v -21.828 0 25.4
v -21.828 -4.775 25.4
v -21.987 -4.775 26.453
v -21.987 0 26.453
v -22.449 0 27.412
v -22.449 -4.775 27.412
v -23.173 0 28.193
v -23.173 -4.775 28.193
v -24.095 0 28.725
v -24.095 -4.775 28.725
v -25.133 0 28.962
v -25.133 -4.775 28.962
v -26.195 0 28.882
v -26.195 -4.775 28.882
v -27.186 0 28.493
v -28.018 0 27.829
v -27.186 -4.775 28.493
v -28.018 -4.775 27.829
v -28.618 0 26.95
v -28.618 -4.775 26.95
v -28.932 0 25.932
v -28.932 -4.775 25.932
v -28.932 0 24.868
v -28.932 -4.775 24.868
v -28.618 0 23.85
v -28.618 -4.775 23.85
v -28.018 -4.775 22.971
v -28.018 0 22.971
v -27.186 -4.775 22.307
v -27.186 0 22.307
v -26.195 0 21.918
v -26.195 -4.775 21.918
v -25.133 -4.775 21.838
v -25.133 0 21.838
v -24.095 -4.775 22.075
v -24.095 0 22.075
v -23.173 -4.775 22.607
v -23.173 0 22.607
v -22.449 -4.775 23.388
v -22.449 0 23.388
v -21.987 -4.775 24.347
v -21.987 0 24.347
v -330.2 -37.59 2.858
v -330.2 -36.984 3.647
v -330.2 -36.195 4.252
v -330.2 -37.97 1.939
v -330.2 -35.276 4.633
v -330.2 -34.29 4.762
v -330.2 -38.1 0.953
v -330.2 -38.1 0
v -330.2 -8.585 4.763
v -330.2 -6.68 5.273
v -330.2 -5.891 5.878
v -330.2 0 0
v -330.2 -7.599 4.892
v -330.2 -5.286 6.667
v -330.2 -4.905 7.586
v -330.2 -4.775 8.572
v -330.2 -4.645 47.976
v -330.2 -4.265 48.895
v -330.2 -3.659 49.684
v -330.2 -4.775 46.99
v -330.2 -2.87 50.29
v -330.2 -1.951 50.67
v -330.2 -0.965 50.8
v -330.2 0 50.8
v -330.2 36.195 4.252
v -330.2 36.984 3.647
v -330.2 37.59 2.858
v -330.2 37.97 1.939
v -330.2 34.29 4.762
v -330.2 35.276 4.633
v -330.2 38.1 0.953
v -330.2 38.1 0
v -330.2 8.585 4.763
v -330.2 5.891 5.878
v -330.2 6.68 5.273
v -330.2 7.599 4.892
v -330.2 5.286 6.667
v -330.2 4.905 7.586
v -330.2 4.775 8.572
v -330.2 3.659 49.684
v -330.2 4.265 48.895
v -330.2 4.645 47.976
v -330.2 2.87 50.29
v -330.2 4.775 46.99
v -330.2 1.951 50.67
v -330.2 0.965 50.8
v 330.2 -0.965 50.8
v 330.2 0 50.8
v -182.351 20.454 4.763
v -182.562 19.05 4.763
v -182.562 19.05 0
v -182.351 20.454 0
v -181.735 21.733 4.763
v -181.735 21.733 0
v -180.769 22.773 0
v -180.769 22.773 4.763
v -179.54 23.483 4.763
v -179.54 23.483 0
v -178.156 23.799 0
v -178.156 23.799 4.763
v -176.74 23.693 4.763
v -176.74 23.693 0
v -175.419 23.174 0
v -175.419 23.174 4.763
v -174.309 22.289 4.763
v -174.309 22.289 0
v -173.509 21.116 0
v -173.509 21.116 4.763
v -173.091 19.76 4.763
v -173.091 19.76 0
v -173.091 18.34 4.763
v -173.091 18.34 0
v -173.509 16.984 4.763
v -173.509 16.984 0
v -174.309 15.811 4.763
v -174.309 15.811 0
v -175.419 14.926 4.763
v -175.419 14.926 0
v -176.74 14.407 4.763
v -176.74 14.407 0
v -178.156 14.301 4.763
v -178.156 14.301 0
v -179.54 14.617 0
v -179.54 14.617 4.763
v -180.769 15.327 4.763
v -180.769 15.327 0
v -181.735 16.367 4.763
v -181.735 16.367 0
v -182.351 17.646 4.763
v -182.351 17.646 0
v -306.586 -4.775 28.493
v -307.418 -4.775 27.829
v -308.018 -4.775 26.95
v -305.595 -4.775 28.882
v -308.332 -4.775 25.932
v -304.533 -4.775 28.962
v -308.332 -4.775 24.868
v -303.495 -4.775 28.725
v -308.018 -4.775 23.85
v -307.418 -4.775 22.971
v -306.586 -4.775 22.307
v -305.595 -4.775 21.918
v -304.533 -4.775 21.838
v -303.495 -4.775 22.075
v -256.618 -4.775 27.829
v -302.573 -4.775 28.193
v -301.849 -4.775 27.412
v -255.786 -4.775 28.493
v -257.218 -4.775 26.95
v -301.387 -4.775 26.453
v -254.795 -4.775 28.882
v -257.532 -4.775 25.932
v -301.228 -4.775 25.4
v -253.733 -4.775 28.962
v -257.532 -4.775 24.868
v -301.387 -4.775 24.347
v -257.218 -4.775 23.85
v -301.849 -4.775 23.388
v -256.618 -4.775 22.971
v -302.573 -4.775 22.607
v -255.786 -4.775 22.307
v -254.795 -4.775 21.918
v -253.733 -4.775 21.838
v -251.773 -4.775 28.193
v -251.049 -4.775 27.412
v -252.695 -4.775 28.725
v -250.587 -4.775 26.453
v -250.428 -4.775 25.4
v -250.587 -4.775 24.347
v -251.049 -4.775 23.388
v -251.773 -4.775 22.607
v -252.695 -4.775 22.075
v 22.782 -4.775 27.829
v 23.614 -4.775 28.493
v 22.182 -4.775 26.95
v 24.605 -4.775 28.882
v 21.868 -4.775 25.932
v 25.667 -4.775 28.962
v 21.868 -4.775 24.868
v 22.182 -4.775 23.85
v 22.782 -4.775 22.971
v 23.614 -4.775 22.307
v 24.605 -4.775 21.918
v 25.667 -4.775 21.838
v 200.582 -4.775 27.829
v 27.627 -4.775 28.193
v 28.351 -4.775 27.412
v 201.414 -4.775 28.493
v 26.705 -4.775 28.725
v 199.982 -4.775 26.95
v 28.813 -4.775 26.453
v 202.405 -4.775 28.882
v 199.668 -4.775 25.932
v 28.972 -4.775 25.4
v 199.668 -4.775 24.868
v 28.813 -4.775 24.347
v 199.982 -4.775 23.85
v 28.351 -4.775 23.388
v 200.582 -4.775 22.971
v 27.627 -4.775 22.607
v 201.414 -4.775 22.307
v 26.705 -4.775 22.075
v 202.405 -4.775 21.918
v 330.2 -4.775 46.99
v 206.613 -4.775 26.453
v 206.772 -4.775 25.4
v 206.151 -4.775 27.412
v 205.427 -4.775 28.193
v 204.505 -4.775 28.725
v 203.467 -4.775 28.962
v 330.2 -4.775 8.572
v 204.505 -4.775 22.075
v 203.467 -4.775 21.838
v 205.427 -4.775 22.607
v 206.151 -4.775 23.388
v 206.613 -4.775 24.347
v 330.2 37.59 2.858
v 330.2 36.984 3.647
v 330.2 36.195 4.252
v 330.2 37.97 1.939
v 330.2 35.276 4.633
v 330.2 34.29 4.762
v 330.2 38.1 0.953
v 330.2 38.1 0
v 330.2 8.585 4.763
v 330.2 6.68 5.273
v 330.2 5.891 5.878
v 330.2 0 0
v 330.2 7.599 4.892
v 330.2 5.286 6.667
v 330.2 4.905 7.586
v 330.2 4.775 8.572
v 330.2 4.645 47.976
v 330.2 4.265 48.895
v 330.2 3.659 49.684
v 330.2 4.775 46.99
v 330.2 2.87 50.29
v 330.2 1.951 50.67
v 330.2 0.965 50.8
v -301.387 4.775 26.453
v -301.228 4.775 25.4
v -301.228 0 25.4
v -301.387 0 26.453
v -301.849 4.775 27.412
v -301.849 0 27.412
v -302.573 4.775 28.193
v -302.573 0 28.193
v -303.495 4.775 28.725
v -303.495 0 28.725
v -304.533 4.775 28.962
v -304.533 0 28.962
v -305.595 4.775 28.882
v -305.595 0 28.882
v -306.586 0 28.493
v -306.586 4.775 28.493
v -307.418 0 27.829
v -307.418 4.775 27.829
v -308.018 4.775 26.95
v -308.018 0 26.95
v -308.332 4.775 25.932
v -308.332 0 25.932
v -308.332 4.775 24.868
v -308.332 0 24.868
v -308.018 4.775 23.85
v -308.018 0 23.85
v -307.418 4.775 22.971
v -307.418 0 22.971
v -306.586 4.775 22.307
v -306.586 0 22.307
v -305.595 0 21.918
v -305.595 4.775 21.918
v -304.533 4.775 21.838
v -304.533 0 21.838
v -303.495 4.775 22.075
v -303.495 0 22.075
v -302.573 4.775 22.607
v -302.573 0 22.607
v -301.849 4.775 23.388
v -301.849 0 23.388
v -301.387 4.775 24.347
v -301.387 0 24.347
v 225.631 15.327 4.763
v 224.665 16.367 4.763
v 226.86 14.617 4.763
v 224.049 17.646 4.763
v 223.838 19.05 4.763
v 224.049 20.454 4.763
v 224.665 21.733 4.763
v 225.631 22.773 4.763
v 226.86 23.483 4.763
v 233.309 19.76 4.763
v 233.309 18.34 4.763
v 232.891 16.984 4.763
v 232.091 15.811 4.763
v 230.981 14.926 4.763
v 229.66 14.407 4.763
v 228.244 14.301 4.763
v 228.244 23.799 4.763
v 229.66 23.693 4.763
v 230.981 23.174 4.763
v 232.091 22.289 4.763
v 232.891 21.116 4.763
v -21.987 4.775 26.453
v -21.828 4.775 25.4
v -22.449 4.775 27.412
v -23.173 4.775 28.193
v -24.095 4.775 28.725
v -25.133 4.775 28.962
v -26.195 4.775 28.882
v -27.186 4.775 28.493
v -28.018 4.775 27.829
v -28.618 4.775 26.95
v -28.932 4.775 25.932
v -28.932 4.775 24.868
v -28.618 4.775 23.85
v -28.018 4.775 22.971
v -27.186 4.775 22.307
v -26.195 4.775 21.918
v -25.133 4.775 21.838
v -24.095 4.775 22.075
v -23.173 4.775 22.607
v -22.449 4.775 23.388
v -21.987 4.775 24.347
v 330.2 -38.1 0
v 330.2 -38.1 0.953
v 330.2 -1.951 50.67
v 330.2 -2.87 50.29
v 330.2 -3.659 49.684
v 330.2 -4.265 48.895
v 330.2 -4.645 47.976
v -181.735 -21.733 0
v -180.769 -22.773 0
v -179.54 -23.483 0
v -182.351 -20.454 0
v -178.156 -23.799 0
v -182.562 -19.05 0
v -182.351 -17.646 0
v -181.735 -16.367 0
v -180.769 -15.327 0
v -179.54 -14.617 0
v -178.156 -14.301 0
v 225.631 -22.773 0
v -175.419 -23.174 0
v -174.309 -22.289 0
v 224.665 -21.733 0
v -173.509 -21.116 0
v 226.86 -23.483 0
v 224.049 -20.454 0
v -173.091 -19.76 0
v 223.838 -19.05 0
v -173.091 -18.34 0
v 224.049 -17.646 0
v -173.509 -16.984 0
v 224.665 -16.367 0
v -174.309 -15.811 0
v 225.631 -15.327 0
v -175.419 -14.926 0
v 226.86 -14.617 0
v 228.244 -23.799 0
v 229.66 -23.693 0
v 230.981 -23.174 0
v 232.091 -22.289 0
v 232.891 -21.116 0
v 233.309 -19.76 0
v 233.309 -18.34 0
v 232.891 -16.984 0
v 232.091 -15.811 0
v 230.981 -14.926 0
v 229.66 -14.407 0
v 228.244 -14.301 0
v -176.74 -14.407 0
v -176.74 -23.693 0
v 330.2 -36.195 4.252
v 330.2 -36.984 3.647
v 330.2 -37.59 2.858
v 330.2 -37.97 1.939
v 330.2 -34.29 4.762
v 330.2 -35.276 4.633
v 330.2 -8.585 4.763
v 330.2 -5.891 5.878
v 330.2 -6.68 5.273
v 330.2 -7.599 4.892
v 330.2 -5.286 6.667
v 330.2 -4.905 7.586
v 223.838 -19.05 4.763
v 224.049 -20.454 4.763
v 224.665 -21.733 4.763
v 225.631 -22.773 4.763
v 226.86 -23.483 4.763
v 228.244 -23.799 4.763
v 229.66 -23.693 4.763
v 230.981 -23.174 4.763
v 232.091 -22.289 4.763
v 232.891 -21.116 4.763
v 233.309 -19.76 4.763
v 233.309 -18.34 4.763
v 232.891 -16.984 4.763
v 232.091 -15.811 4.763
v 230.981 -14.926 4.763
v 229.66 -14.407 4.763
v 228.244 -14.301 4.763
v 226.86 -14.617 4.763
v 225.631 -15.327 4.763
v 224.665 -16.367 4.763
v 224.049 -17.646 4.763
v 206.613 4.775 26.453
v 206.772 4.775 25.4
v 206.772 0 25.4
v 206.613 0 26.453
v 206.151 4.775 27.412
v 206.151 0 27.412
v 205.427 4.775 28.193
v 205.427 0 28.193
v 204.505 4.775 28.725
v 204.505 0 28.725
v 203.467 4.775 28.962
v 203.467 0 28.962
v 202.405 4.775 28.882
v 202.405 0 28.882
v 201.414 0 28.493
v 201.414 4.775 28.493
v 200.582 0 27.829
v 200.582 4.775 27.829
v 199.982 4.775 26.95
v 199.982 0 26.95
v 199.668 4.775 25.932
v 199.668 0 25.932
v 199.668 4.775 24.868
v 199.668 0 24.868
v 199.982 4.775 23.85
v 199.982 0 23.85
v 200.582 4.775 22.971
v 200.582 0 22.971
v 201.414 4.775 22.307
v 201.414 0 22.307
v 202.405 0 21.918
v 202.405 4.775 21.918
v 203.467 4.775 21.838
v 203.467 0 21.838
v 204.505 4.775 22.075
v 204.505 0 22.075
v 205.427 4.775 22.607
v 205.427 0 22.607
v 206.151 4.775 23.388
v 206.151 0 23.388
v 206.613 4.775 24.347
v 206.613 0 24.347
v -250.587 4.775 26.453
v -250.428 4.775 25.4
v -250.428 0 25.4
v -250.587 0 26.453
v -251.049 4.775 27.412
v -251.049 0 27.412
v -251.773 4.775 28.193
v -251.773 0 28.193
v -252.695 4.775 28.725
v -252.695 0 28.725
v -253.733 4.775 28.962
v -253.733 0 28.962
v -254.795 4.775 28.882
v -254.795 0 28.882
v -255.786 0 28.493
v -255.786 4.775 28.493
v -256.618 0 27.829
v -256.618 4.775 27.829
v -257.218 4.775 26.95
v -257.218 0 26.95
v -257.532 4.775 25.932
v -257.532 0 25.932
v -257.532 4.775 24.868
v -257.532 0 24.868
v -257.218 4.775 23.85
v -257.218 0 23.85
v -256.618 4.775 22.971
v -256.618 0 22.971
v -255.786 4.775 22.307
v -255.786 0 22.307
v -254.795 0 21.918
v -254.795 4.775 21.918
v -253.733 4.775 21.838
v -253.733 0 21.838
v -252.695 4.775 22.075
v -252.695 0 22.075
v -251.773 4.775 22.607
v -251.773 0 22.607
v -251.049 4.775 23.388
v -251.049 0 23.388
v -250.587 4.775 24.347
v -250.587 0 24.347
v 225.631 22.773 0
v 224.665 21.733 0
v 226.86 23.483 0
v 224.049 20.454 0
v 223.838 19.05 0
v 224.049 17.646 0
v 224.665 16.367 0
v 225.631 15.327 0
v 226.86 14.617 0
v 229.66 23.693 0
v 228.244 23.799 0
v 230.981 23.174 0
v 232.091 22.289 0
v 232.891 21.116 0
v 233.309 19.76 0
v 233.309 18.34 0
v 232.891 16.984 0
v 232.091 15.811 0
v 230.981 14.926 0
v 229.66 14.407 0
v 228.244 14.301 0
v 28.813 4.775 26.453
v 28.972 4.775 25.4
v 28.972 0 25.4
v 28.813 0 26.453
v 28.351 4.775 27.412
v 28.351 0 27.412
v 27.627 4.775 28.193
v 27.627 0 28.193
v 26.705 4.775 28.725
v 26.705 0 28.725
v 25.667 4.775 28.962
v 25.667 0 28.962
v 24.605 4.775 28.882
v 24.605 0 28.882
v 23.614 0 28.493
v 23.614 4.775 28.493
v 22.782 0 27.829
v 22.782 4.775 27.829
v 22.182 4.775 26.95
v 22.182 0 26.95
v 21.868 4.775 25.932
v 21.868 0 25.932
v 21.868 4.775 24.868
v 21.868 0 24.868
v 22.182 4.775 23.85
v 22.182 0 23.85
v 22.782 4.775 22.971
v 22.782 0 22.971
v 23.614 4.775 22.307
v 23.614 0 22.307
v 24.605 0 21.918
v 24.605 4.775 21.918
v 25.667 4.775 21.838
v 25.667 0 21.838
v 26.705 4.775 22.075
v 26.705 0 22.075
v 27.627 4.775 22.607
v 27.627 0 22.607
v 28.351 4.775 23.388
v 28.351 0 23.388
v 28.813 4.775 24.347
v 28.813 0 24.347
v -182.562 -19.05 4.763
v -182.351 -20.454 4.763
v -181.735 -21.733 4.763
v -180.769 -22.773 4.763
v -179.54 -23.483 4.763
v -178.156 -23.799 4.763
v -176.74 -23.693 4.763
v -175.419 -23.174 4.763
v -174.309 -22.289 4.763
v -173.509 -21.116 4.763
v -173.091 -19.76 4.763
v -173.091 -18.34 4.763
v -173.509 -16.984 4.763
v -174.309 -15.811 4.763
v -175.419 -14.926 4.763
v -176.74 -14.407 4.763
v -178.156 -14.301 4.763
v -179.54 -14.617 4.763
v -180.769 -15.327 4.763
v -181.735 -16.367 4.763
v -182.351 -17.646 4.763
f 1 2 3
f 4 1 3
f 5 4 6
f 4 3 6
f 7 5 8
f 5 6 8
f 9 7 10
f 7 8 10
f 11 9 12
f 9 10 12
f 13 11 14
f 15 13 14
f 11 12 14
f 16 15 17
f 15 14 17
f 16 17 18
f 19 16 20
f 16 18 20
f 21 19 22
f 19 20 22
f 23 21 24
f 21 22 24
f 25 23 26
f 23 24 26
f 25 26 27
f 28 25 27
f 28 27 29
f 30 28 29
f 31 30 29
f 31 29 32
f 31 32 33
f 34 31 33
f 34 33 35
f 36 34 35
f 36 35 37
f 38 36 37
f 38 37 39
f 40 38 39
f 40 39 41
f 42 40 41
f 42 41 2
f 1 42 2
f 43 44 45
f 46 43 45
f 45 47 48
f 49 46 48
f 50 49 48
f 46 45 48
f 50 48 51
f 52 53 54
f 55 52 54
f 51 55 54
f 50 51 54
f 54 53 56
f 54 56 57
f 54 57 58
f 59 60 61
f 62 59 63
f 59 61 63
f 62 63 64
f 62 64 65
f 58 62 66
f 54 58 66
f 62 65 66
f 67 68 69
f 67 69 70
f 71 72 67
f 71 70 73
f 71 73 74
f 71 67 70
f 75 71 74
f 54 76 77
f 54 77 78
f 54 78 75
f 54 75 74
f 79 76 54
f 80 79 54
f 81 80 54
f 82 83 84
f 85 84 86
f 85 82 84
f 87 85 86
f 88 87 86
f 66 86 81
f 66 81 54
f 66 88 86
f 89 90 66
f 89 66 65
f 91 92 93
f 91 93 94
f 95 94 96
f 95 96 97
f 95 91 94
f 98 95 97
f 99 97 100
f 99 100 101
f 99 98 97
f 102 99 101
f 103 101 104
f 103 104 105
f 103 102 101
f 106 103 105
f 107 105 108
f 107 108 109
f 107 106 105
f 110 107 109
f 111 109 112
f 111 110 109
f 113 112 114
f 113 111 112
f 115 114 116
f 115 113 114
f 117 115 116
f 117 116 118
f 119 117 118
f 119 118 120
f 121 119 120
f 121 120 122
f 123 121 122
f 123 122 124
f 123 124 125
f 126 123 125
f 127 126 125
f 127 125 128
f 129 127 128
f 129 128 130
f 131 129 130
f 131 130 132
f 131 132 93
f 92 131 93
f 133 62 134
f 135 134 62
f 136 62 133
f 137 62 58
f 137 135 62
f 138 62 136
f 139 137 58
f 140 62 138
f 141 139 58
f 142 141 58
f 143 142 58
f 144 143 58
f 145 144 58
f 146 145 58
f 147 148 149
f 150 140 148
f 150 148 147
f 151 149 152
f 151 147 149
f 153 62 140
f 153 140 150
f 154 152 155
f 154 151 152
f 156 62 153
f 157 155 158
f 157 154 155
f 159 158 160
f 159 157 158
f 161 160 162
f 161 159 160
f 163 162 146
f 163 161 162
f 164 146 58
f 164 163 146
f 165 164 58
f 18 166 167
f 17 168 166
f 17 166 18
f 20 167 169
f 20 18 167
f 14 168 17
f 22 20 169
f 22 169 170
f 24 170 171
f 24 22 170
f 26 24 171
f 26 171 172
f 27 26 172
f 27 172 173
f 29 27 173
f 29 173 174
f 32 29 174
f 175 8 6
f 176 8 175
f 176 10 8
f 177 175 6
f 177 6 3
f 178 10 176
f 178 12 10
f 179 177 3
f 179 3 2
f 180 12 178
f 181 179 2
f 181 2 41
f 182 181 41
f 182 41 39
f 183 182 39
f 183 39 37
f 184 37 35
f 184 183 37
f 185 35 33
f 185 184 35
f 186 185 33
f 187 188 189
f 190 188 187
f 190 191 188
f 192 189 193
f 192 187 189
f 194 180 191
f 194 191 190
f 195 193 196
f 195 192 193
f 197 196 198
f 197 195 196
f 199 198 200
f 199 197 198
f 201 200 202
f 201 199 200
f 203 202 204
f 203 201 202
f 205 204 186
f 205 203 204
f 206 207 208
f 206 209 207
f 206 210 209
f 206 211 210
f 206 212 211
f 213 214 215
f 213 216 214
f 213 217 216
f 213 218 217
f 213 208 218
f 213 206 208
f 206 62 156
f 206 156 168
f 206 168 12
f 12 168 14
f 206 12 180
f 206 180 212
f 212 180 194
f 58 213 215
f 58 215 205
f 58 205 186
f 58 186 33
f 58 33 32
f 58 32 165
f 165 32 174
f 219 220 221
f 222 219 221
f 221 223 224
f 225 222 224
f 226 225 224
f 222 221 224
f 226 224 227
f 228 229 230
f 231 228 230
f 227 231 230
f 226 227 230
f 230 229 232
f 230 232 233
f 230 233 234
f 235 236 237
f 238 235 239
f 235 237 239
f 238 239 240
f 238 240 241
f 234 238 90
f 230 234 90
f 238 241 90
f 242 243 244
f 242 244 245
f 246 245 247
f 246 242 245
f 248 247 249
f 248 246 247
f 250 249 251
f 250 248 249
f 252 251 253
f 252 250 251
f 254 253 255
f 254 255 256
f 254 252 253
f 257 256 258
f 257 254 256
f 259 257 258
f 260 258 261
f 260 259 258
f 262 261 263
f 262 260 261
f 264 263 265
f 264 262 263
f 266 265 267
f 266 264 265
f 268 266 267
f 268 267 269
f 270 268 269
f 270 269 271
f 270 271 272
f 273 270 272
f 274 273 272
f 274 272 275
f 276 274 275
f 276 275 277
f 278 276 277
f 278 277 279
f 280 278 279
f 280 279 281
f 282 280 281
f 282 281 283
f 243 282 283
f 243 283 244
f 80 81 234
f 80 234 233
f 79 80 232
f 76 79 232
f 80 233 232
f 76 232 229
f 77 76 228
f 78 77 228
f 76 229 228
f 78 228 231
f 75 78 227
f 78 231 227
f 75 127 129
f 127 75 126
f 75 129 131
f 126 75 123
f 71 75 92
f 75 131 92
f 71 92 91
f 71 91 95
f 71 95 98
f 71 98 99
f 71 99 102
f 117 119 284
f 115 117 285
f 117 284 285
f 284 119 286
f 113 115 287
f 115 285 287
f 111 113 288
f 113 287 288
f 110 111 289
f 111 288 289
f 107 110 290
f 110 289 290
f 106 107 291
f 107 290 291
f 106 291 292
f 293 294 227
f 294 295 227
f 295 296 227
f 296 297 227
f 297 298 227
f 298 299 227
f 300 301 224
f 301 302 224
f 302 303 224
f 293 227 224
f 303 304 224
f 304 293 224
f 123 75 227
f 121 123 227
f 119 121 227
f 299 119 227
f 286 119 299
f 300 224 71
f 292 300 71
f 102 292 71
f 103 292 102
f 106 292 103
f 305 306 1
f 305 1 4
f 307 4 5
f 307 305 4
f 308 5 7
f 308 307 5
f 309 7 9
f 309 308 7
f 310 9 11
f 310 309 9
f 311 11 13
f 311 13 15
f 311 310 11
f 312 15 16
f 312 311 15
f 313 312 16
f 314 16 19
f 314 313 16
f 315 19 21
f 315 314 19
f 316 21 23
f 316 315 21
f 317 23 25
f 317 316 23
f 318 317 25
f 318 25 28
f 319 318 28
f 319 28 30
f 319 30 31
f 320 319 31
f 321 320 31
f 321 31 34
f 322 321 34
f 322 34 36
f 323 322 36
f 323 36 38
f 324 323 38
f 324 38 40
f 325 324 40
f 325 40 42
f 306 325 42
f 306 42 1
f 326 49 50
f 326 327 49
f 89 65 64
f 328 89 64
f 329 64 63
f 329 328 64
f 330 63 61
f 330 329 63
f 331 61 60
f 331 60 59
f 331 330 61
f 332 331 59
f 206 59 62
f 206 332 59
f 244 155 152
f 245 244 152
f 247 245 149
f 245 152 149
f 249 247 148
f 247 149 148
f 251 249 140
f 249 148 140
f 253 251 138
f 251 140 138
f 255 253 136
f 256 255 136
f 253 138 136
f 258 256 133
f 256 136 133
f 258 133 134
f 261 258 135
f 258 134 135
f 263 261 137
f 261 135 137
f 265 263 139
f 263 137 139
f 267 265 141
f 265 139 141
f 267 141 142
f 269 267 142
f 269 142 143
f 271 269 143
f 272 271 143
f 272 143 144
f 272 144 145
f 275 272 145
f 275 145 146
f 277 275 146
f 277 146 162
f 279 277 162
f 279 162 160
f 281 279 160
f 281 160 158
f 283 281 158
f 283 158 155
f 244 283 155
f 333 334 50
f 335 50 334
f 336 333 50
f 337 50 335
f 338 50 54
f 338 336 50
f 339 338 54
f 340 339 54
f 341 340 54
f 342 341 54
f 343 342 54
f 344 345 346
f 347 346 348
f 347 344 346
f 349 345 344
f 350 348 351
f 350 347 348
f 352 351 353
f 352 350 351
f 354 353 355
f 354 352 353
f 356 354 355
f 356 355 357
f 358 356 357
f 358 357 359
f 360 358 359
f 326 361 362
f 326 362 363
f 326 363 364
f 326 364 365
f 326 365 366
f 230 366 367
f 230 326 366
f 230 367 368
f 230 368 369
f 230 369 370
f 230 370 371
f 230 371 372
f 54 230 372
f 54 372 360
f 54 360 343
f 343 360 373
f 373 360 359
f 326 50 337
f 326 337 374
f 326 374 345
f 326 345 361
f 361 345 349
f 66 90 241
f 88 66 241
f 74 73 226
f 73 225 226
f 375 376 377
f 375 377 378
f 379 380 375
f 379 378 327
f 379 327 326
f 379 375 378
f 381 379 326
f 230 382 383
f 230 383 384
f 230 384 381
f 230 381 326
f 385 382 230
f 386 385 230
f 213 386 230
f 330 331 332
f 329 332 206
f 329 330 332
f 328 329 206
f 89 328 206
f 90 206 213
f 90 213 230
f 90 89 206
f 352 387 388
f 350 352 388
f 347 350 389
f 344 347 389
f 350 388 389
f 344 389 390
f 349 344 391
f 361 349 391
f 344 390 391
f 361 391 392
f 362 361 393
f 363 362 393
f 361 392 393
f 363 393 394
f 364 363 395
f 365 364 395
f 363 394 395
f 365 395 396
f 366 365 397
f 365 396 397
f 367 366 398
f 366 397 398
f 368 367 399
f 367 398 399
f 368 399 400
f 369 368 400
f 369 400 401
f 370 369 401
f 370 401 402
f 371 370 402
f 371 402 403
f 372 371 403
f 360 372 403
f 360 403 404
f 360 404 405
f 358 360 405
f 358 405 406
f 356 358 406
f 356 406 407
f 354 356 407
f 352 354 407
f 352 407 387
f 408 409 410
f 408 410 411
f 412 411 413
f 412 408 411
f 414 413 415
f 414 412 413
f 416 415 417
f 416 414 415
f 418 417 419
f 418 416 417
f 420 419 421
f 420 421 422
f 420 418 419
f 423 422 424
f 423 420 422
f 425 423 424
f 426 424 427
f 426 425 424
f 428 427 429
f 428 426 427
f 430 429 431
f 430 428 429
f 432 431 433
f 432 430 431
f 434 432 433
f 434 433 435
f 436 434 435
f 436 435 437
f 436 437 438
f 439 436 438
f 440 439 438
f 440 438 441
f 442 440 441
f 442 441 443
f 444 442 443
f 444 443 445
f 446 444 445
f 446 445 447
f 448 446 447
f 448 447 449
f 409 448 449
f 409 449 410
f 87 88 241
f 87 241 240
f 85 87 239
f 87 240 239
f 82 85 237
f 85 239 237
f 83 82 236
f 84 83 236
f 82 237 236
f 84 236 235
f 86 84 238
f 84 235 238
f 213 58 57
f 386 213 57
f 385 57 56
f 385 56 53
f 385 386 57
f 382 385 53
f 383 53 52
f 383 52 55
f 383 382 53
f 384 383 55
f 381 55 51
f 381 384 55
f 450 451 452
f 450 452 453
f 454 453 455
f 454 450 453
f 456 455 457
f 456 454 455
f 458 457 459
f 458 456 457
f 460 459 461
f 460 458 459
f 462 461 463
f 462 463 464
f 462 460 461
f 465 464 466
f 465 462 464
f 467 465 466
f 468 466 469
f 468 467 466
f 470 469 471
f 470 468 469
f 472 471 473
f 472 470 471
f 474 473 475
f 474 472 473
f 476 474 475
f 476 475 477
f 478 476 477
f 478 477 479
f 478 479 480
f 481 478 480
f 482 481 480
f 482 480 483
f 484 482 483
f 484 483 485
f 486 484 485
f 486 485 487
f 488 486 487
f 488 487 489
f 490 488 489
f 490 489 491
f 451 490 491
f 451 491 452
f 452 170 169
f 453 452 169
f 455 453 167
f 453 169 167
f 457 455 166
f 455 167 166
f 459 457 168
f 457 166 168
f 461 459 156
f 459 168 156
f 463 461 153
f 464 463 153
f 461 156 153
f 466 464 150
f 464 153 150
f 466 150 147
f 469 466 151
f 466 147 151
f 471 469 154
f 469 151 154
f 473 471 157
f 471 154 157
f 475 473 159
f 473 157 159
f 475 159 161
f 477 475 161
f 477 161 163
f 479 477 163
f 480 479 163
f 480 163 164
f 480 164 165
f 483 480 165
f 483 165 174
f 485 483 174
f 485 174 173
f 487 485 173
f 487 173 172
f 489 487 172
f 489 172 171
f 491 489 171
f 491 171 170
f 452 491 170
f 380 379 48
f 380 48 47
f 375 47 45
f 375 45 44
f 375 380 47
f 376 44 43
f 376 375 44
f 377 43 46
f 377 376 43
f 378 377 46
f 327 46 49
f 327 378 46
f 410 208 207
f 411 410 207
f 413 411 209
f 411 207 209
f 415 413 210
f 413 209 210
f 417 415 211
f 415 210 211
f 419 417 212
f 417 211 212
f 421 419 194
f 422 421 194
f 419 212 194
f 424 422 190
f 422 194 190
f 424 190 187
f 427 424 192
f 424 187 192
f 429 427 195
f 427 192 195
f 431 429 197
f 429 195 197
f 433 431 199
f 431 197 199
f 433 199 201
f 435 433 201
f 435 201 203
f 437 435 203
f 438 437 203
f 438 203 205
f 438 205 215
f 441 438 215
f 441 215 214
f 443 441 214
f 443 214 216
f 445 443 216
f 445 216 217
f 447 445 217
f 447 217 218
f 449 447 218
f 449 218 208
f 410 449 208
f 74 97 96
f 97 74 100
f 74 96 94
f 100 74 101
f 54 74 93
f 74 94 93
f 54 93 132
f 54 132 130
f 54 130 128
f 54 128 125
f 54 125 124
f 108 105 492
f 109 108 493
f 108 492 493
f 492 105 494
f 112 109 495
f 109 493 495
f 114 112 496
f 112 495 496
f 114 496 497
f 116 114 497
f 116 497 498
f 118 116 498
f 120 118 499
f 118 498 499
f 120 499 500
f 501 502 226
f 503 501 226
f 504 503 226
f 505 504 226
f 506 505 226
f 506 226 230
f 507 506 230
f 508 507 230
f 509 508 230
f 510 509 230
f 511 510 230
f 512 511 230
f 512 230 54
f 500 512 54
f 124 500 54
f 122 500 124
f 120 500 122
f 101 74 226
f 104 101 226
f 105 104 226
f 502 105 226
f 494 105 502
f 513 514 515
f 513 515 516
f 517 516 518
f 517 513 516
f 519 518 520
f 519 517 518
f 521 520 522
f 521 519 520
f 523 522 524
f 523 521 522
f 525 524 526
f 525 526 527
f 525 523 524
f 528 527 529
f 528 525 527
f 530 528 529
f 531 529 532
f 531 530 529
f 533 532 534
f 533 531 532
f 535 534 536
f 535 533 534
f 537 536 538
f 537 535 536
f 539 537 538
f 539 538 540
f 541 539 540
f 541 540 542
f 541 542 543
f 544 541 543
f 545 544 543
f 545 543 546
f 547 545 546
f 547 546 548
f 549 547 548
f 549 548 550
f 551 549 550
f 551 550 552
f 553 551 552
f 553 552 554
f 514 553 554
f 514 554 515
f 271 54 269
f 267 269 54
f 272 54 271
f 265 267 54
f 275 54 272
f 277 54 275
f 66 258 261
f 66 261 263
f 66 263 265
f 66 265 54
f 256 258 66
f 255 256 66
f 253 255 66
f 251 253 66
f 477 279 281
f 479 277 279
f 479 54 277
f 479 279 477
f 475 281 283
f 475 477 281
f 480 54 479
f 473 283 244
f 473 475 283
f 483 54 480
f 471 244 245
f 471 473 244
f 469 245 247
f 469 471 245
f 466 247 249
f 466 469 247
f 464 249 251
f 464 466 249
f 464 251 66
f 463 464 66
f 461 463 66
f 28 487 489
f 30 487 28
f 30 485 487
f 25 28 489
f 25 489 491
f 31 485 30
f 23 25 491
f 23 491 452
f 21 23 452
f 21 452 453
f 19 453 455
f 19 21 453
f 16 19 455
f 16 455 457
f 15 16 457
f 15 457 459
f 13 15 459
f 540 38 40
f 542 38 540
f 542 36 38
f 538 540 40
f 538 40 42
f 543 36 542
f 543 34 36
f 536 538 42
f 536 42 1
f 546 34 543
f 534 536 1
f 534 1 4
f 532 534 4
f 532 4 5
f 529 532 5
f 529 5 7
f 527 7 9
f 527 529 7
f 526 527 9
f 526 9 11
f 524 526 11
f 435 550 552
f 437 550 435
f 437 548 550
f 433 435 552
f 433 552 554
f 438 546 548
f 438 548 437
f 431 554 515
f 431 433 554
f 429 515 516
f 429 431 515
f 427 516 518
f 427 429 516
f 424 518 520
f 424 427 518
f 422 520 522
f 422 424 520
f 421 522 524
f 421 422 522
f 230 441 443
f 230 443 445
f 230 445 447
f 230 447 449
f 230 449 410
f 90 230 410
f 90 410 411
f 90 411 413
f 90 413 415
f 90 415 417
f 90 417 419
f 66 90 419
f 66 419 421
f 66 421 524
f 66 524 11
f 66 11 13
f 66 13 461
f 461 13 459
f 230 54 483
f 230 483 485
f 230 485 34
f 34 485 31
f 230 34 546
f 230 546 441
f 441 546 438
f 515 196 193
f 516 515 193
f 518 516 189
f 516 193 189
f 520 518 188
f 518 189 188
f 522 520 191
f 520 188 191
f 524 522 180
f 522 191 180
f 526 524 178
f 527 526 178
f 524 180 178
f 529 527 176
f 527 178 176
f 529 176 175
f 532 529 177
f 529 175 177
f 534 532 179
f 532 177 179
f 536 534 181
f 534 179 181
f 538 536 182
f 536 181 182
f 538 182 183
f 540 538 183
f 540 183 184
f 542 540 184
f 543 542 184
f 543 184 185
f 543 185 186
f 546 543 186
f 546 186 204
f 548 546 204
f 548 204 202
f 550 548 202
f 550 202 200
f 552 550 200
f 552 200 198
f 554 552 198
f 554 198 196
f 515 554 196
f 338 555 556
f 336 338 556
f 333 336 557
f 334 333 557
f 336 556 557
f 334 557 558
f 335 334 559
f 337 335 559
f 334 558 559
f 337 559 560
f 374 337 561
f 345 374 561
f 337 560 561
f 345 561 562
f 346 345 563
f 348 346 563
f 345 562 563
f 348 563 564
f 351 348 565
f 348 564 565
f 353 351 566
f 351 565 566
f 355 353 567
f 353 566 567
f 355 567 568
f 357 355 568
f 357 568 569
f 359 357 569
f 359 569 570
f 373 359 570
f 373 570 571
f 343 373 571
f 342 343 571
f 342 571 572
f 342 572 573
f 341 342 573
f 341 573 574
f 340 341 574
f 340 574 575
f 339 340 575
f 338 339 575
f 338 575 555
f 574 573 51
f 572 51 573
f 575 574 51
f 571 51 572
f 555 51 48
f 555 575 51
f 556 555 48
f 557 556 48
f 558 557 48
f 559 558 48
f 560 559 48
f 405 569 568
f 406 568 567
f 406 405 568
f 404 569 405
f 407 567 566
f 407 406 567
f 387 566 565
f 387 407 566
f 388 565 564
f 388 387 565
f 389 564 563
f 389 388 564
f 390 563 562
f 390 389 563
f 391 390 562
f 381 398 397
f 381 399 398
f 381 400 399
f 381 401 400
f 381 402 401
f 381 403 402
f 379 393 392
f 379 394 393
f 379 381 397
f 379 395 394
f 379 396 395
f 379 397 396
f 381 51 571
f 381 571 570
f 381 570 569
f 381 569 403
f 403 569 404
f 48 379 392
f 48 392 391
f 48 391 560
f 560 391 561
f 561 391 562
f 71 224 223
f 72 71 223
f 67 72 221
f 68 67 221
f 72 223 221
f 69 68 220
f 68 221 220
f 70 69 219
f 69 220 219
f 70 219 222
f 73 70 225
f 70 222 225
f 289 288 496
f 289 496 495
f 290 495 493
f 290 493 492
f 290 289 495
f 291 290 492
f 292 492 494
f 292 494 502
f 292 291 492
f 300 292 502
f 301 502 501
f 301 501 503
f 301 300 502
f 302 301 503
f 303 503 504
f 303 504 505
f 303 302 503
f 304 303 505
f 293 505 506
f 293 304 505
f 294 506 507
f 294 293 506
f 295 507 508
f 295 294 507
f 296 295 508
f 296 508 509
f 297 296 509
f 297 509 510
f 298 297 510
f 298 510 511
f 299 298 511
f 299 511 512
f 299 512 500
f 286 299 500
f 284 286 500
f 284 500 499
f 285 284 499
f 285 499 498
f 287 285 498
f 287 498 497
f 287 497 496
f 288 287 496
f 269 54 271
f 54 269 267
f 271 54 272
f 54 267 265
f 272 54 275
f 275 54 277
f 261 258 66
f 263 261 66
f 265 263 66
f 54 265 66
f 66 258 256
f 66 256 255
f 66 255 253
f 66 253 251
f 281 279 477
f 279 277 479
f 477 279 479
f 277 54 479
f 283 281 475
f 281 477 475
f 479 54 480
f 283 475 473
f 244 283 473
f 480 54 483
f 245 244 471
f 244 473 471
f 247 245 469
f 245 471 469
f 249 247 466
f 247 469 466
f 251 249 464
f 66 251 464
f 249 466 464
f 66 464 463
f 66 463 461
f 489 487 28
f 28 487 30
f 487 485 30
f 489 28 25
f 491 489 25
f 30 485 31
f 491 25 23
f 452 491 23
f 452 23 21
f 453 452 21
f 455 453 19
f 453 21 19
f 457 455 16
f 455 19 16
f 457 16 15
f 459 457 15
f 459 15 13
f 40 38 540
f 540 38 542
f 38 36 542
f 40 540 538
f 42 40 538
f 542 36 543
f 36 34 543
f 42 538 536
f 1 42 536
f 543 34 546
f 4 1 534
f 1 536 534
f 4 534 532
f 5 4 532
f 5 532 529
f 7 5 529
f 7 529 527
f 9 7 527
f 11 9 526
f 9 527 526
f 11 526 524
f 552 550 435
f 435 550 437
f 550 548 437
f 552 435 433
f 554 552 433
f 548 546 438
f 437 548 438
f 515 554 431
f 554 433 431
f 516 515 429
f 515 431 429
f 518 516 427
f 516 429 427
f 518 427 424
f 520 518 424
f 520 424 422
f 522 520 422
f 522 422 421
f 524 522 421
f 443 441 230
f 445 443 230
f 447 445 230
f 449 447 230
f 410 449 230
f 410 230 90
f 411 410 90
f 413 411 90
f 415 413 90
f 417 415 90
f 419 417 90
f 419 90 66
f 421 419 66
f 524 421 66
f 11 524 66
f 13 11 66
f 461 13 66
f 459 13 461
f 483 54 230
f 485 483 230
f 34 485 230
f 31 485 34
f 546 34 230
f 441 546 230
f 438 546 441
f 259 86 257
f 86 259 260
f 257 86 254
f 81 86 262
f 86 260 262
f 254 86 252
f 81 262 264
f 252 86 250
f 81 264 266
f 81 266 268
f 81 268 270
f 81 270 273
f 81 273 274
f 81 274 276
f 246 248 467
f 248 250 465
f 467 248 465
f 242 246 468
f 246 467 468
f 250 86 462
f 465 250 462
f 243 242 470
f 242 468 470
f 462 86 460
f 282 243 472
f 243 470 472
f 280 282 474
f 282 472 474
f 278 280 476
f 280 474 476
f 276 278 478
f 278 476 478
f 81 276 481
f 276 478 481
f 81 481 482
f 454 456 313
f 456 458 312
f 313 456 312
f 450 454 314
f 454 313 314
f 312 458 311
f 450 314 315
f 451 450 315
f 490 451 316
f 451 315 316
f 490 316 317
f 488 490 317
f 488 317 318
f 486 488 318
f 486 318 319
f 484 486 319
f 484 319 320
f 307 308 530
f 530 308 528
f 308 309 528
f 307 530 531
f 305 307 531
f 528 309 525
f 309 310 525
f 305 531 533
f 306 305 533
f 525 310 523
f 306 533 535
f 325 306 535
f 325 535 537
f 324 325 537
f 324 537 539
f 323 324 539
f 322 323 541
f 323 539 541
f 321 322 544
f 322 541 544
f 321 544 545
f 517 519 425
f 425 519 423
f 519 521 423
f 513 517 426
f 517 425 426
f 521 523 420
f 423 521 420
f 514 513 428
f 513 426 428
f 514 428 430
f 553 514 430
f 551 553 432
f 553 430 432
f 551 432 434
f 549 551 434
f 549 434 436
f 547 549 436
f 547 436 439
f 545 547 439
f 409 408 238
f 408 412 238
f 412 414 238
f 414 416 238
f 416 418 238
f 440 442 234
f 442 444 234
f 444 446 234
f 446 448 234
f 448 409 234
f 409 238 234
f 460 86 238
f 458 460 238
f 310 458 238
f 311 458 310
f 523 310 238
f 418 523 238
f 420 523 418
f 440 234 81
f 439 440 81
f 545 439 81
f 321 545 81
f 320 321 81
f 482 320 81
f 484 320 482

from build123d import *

# Parameters (mm, degrees)
F1_DEPTH = 330.2
F3_D     = 7.14375
F5_D     = 9.525


with BuildPart() as f1:
    # F0 (on Right) → F1 (new body, symmetric)
    with BuildSketch(Plane.YZ):
        with BuildLine():
            Line((0, 0), (0, 50.8))
            Line((0, 50.8), (-0.9652, 50.8))
            ThreePointArc((-0.9652, 50.8), (-3.659277, 49.684077), (-4.7752, 46.99))
            Line((-4.7752, 46.99), (-4.7752, 8.5725))
            ThreePointArc((-4.7752, 8.5725), (-5.891123, 5.878423), (-8.5852, 4.7625))
            Line((-8.5852, 4.7625), (-34.29, 4.7625))
            ThreePointArc((-34.29, 4.7625), (-36.984077, 3.646577), (-38.1, 0.9525))
            Line((-38.1, 0.9525), (-38.1, 0))
            Line((-38.1, 0), (0, 0))
        make_face()
    extrude(amount=F1_DEPTH, both=True)

    # F3 (through all)
    with Locations(Plane(origin=(0, 0, 0), x_dir=(-1, 0, 0), z_dir=(0, 1, 0))):
        with Locations((254, 25.4), (25.4, 25.4), (-203.2, 25.4), (-25.4, 25.4), (304.8, 25.4)):
            Hole(F3_D / 2)

    # F5 (through all)
    with Locations(Plane(origin=(0, 0, 0), x_dir=(1, 0, 0), z_dir=(0, 0, -1))):
        with Locations((228.6, 19.05), (-177.8, 19.05)):
            Hole(F5_D / 2)


with BuildPart() as f6_1:
    # F6: instance of F1
    add(f1.part.mirror(Plane.XZ))


solid = Compound([f1.part, f6_1.part])
